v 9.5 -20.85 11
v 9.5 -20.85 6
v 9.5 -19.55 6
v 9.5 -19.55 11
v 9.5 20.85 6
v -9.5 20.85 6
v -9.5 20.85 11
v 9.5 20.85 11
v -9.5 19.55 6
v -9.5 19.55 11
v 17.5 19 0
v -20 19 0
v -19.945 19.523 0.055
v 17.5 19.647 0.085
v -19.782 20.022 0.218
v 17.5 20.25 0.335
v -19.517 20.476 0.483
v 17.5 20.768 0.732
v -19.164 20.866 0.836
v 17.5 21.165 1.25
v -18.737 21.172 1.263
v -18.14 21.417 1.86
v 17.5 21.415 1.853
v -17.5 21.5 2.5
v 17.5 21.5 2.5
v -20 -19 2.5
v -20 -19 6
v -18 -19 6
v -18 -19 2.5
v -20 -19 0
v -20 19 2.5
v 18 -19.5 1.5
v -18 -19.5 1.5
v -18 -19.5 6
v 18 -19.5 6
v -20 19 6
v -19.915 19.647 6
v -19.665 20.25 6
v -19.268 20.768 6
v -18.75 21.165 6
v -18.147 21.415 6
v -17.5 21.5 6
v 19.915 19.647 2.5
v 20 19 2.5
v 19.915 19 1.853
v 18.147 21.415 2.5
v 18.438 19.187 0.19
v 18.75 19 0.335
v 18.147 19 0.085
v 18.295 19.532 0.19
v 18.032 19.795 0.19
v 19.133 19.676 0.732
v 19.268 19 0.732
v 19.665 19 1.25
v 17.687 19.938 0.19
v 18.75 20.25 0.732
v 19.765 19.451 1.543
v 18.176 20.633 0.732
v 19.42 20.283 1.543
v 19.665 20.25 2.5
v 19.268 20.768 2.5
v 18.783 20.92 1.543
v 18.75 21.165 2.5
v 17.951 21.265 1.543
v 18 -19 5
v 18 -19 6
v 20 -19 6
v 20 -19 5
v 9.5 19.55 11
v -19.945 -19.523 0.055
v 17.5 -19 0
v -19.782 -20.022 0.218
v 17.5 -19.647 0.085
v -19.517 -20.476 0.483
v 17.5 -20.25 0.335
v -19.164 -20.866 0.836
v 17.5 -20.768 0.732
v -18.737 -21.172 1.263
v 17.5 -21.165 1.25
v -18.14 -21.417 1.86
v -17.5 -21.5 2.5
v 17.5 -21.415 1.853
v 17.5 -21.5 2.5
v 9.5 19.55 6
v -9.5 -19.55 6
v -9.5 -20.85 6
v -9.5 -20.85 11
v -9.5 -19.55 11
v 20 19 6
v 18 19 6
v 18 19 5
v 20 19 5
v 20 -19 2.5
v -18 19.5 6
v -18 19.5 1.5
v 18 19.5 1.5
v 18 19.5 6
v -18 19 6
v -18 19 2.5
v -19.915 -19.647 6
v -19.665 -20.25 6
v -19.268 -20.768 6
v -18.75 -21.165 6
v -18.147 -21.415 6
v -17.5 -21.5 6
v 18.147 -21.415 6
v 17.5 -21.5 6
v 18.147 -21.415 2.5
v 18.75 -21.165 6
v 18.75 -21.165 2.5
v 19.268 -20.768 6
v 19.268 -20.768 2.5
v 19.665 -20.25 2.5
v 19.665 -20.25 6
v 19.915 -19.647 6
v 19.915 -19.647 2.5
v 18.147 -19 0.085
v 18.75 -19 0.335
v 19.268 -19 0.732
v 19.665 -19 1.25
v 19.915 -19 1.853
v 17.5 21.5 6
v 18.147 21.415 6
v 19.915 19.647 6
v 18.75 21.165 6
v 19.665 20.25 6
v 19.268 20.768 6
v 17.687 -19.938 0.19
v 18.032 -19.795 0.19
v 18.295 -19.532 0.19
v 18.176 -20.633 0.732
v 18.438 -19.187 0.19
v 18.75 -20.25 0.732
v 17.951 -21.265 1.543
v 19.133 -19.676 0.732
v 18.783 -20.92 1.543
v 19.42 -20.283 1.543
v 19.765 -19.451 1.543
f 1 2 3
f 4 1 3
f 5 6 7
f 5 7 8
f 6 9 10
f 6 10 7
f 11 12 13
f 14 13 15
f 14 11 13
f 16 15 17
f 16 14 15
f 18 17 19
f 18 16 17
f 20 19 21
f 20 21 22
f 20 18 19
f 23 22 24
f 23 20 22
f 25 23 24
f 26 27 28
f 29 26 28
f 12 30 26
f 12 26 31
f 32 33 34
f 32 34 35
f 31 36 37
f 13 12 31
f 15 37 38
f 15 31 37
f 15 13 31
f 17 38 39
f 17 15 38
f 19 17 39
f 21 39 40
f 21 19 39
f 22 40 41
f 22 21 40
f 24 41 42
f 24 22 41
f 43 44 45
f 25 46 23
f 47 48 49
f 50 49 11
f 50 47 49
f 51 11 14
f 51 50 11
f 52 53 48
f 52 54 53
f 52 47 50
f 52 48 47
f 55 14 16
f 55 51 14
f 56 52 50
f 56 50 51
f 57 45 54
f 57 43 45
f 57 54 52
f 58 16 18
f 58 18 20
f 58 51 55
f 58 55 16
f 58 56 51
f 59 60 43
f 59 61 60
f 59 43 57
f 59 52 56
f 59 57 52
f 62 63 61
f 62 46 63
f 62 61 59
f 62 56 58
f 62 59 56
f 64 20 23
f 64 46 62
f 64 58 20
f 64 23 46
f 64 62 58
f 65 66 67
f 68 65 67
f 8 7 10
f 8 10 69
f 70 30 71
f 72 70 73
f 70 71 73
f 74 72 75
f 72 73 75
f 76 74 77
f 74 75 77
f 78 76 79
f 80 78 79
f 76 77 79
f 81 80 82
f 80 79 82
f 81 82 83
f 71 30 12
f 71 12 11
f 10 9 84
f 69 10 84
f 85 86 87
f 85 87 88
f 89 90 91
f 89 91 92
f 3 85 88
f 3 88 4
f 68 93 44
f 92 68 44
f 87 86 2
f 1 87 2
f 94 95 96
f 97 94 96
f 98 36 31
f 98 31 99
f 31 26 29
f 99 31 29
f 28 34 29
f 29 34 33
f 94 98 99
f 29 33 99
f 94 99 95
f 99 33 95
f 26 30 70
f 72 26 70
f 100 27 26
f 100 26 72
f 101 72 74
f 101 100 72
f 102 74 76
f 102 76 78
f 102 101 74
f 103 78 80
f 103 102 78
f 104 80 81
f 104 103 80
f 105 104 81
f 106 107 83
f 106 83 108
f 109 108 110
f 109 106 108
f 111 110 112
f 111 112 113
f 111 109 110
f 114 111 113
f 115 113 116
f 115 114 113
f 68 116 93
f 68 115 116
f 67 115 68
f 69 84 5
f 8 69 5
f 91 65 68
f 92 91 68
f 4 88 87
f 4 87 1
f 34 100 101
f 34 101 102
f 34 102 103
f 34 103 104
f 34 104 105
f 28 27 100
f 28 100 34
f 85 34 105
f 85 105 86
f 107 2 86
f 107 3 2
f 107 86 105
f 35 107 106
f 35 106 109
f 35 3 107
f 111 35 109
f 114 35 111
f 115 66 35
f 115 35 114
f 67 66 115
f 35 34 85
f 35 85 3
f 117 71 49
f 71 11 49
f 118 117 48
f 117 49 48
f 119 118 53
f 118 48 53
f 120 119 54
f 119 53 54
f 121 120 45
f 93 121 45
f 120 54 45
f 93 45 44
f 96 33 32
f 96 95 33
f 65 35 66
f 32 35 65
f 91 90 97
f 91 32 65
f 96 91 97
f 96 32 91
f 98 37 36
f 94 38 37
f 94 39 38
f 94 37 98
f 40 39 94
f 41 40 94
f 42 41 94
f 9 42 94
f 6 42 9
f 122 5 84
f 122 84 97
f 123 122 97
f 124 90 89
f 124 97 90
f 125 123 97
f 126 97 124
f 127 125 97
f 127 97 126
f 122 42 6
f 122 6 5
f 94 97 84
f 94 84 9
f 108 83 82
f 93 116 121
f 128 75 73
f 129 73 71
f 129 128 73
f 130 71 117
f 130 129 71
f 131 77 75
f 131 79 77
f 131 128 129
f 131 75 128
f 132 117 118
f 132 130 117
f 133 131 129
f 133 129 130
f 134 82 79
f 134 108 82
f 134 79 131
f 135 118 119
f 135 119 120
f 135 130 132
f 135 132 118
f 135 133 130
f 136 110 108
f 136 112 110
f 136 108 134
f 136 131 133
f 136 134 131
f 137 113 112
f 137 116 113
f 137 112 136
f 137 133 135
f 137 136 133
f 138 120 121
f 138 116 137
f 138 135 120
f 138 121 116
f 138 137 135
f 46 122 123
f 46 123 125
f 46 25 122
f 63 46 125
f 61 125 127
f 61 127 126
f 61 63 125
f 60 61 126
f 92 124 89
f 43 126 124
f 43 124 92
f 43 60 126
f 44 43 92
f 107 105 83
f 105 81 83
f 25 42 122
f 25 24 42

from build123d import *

# Parameters (mm, degrees)
F0_W     = 40
F0_H     = 43
F0_W_2   = 36
F0_H_2   = 39
F1_DEPTH = 1.5
F2_DEPTH = 6
F3_W     = 2
F3_H     = 38
F4_DEPTH = 3.5
F5_R     = 2.5
F6_W     = 19
F6_H     = 1.3
F7_DEPTH = 5
F8_DEPTH = 1


with BuildPart() as f1:
    # F0 (on Top) → F1 (new body)
    with BuildSketch(Plane.XY):
        Rectangle(F0_W, F0_H)
        Rectangle(F0_W_2, F0_H_2, mode=Mode.SUBTRACT)
        Rectangle(F0_W_2, F0_H_2)
    extrude(amount=F1_DEPTH)

    # F0 (on Top) → F2 (join)
    with BuildSketch(Plane.XY):
        Rectangle(F0_W, F0_H)
        Rectangle(F0_W_2, F0_H_2, mode=Mode.SUBTRACT)
    extrude(amount=F2_DEPTH)

    # F3 (on face) → F4 (cut)
    with BuildSketch(Plane.XY.offset(6)):
        with Locations((-19, 0)):
            Rectangle(F3_W, F3_H)
    extrude(amount=-F4_DEPTH, mode=Mode.SUBTRACT)

    # F5
    f5_edges = [f1.edges().sort_by_distance(p)[0] for p in [
        (-20, -21.5, 3),
        (20, -21.5, 3),
        (20, 21.5, 3),
        (-20, 21.5, 3),
        (0, -21.5, 0),
        (20, 0, 0),
        (0, 21.5, 0),
    ]]
    fillet(f5_edges, radius=F5_R)

    # F6 (on face) → F7 (join)
    with BuildSketch(Plane.XY.offset(6)):
        with Locations((0, 20.2)):
            Rectangle(F6_W, F6_H)
        with Locations((0, -20.2)):
            Rectangle(F6_W, F6_H)
    extrude(amount=F7_DEPTH)

    # F3 (on face) → F8 (cut)
    with BuildSketch(Plane.XY.offset(6)):
        with Locations((19, 0)):
            Rectangle(F3_W, F3_H)
    extrude(amount=-F8_DEPTH, mode=Mode.SUBTRACT)


solid = f1.part
